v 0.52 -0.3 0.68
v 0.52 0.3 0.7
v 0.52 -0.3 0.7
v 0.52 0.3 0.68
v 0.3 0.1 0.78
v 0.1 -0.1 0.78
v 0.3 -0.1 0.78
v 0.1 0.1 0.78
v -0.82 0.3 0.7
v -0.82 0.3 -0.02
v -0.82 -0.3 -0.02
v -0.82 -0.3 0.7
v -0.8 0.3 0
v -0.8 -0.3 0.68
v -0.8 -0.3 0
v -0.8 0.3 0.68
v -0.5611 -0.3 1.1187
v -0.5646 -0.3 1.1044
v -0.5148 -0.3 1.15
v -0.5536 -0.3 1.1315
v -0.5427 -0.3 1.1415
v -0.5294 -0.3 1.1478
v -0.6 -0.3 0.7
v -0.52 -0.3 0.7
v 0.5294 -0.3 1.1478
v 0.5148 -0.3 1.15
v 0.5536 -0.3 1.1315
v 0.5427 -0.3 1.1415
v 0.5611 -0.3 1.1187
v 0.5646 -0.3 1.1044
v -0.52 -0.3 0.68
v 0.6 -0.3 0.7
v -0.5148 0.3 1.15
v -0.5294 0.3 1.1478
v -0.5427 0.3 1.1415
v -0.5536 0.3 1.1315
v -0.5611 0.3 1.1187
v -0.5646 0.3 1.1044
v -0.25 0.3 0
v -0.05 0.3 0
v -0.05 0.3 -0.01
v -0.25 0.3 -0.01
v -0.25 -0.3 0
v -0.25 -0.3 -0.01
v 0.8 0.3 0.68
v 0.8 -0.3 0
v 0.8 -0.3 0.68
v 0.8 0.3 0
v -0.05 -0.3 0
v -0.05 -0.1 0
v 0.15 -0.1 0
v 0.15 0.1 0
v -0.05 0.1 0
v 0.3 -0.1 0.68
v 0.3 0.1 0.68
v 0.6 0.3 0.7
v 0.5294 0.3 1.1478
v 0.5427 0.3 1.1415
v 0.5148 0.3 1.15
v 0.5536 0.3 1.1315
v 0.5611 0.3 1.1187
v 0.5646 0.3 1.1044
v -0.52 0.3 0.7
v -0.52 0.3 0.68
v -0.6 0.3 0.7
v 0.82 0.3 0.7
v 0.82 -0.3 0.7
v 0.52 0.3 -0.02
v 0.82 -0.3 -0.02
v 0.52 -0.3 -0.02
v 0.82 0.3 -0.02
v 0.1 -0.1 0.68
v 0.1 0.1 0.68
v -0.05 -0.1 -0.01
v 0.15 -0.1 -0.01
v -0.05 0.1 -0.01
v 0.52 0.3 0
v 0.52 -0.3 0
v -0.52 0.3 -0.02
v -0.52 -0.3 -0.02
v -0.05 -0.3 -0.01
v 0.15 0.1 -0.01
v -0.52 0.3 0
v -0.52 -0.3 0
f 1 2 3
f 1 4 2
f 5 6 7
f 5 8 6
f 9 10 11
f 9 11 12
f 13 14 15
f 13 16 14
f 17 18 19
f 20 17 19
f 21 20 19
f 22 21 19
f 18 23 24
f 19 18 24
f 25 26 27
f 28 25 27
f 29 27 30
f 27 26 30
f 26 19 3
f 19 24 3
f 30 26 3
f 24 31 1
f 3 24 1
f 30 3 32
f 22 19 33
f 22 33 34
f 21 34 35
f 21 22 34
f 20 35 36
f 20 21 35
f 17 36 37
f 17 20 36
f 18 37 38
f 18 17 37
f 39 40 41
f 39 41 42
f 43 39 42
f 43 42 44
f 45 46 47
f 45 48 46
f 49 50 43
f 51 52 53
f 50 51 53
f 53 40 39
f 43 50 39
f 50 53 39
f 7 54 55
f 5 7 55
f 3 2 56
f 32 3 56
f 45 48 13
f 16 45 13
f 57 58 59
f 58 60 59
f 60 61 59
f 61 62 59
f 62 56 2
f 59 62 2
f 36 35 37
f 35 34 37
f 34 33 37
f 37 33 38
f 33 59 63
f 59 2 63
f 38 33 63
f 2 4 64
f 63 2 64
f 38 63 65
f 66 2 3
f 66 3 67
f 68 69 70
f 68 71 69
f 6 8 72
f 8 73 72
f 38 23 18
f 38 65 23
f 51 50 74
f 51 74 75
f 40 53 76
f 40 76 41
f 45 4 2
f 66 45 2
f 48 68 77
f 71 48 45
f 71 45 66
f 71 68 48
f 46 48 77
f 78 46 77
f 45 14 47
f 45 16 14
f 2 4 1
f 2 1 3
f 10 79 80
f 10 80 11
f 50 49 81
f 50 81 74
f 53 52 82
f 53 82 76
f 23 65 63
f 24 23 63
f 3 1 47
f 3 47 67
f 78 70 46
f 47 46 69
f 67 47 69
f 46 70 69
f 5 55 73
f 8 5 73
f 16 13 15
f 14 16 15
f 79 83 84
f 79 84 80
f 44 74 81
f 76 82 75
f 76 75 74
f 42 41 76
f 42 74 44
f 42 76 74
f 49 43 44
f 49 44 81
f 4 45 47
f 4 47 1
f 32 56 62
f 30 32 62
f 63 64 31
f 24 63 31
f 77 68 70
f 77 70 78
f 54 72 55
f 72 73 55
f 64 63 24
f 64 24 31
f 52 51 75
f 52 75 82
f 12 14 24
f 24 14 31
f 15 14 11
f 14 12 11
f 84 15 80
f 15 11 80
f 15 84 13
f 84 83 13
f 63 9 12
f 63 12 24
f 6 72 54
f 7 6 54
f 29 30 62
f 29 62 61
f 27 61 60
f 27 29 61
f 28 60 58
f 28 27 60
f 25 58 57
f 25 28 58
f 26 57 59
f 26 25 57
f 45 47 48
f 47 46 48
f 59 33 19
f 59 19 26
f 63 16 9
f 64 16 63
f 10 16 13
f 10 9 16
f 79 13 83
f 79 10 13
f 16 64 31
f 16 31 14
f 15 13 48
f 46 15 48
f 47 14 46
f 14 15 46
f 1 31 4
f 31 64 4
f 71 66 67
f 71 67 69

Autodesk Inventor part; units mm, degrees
ref_plane "YZ Plane" through (0, 0, 0) normal (1, 0, 0) x (0, 1, 0)
ref_plane "XZ Plane" through (0, 0, 0) normal (0, 1, 0) x (-1, 0, 0)
ref_plane "XY Plane" through (0, 0, 0) normal (0, 0, 1) x (1, 0, 0)
sketch "Sketch1" plane through (0, 0, 0) normal (0, 0, 1) x (1, 0, 0)
  line L0 (0.8, 0.3) -> (-0.8, 0.3)
  line L1 (-0.8, 0.3) -> (-0.8, -0.3)
  line L2 (-0.8, -0.3) -> (0.8, -0.3)
  line L3 (0.8, -0.3) -> (0.8, 0.3)
  line L4 (0.8, 0.3) -> (-0.8, -0.3) construction
  line L5 (-0.8, 0.3) -> (0.8, -0.3) construction
  point P0 (0, 0)
  dimension "d0" = 1.6
  dimension "d1" = 0.6
extrude "Extrusion1" add sketch "Sketch1" along normal blind 0.68
sketch "Sketch2" plane through (0, 0, 0.68) normal (0, 0, 1) x (1, 0, 0)
  line L0 (0.8, 0.3) -> (-0.8, 0.3) projected
  line L1 (-0.8, 0.3) -> (-0.8, -0.3) projected
  line L2 (-0.8, -0.3) -> (0.8, -0.3) projected
  line L3 (0.8, -0.3) -> (0.8, 0.3) projected
  line L4 (0.3, 0.1) -> (0.1, 0.1)
  line L5 (0.1, 0.1) -> (0.1, -0.1)
  line L6 (0.1, -0.1) -> (0.3, -0.1)
  line L7 (0.3, -0.1) -> (0.3, 0.1)
  line L8 (0.3, 0.1) -> (0.1, -0.1) construction
  line L9 (0.1, 0.1) -> (0.3, -0.1) construction
  point P0 (0, 0)
  point P1 (0.2, 0)
  dimension "d4" = 0.2
  dimension "d5" = 0.2
  dimension "d6" = 1
extrude "Extrusion2" add sketch "Sketch2" along normal blind 0.1 separate body contours L7 L6 L5 L4
sketch "Sketch3" plane through (-0.8, 0.3, 0) normal (0, 1, 0) x (1, 0, 0)
  line L0 (1.6, 0) -> (0, 0) projected
  line L1 (0, 0) -> (0, -0.68) projected
  line L2 (1.6, -0.68) -> (0, -0.68) projected
  line L3 (1.6, 0) -> (1.6, -0.68) projected
  line L4 (1.32, -0.68) -> (1.32, -0.7)
  line L5 (1.32, -0.7) -> (1.62, -0.7)
  line L6 (1.62, -0.7) -> (1.62, 0.02)
  line L7 (1.62, 0.02) -> (1.32, 0.02)
  line L8 (1.32, 0.02) -> (1.32, 0)
  line L9 (1.6, 0) -> (0, 0) projected
  point P0 (0.8, 0)
  dimension "d9" = 0.02
  dimension "d10" = 0.02
  dimension "d11" = 0.02
  dimension "d12" = 0.3
extrude "Extrusion3" add sketch "Sketch3" against normal up to surface (0.6 mm away) separate body contours L0 L8 L7 L6 L5 L4 L2 L3
mirror "Mirror1" about plane through (0, 0, 0) normal (1, 0, 0) of "Extrusion3" bodies 3
sketch "Sketch4" plane through (0, 0, 0.68) normal (0, 0, 1) x (1, 0, 0)
  line L0 (0.8, 0.3) -> (-0.8, 0.3) projected
  line L1 (-0.8, 0.3) -> (-0.8, -0.3) projected
  line L2 (-0.8, -0.3) -> (0.8, -0.3) projected
  line L3 (0.8, -0.3) -> (0.8, 0.3) projected
  line L4 (0.6123, 0.3) -> (-0.6123, 0.3)
  line L5 (-0.6123, 0.3) -> (-0.6123, -0.3)
  line L6 (-0.6123, -0.3) -> (0.6123, -0.3)
  line L7 (0.6123, -0.3) -> (0.6123, 0.3)
  line L8 (0.6123, 0.3) -> (-0.6123, -0.3) construction
  line L9 (-0.6123, 0.3) -> (0.6123, -0.3) construction
  line L10 (0.52, 0.3) -> (0.52, -0.3) projected
  line L11 (-0.52, 0.3) -> (-0.52, -0.3) projected
  point P0 (0, 0)
extrude "Extrusion4" add sketch "Sketch4" along normal up to surface (0.02 mm away) separate body contours L10 L2 L11 L0
sketch "Sketch5" plane through (-0.52, 0.3, 0.7) normal (0, 0, 1) x (1, 0, 0)
  line L0 (1.04, 0) -> (1.04, -0.6) projected
  line L1 (0, 0) -> (1.04, 0) projected
  line L2 (0, -0.6) -> (0, 0) projected
  line L3 (1.04, -0.6) -> (0, -0.6) projected
  line L4 (1.12, 0) -> (-0.08, 0)
  line L5 (-0.08, 0) -> (-0.08, -0.6)
  line L6 (-0.08, -0.6) -> (1.12, -0.6)
  line L7 (1.12, -0.6) -> (1.12, 0)
  line L8 (1.12, 0) -> (-0.08, -0.6) construction
  line L9 (-0.08, 0) -> (1.12, -0.6) construction
  point P0 (0.52, -0.3)
  dimension "d17" = 1.2
extrude "Extrusion5" add sketch "Sketch5" along normal blind 0.45 bodies 4
sketch "Sketch6" plane through (-0.52, 0.3, 0.68) normal (0, 1, 0) x (1, 0, 0)
  line L0 (1.04, 0) -> (1.04, -0.02) projected
  line L1 (1.04, 0) -> (0, 0) projected
  line L2 (0, 0) -> (0, -0.02) projected
  line L3 (0, -0.02) -> (-0.08, -0.02) projected
  line L4 (-0.08, -0.02) -> (-0.08, -0.47) projected
  line L5 (1.12, -0.47) -> (-0.08, -0.47) projected
  line L6 (1.12, -0.02) -> (1.12, -0.47) projected
  line L7 (1.12, -0.02) -> (1.04, -0.02) projected
  line L8 (1.12, -0.02) -> (1.0806, -0.47)
  line L9 (-0.08, -0.02) -> (-0.0406, -0.47)
  point P0 (0.52, 0.68)
  dimension "d20" = 5
  dimension "d21" = 5
extrude "Extrusion6" cut sketch "Sketch6" against normal through all contours L6 L5 L8 | L9 L5 L4 bodies 4
fillet "Fillet1" radius 0.05 2 edges at (0.5606, 0, 1.15) (-0.5606, 0, 1.15)
sketch "Sketch7" plane through (0, 0, 0) normal (0, 0, -1) x (-1, 0, 0)
  line L0 (-0.8, 0.3) -> (0.8, 0.3) projected
  line L1 (-0.8, -0.3) -> (-0.8, 0.3) projected
  line L2 (0.8, -0.3) -> (-0.8, -0.3) projected
  line L3 (0.8, 0.3) -> (0.8, -0.3) projected
  line L4 (-0.8, 0.3) -> (0.8, 0.3) projected
  line L5 (0.25, -0.3) -> (0.05, -0.3)
  line L6 (0.05, -0.3) -> (0.05, 0.3)
  line L7 (0.05, 0.3) -> (0.25, 0.3)
  line L8 (0.25, 0.3) -> (0.25, -0.3)
  line L9 (0.25, -0.3) -> (0.05, 0.3) construction
  line L10 (0.05, -0.3) -> (0.25, 0.3) construction
  line L11 (0.05, -0.1) -> (-0.15, -0.1)
  line L12 (-0.15, -0.1) -> (-0.15, 0.1)
  line L13 (-0.15, 0.1) -> (0.05, 0.1)
  line L14 (0.05, 0.1) -> (0.05, -0.1)
  line L15 (0.8, -0.3) -> (-0.8, -0.3) projected
  point P0 (0, 0)
  point P1 (0.15, 0)
  dimension "d25" = 0.1
  dimension "d26" = 0.1
  dimension "d27" = 0.2
  dimension "d28" = 0.05
  dimension "d29" = 0.15
extrude "Extrusion7" add sketch "Sketch7" along normal blind 0.01 separate body contours L0 L8 L2 L6 | L6 L11 L12 L13
equation "\"d21\" = d20"
properties part number "LTST-S270GKT" material "ABS Plastic"
